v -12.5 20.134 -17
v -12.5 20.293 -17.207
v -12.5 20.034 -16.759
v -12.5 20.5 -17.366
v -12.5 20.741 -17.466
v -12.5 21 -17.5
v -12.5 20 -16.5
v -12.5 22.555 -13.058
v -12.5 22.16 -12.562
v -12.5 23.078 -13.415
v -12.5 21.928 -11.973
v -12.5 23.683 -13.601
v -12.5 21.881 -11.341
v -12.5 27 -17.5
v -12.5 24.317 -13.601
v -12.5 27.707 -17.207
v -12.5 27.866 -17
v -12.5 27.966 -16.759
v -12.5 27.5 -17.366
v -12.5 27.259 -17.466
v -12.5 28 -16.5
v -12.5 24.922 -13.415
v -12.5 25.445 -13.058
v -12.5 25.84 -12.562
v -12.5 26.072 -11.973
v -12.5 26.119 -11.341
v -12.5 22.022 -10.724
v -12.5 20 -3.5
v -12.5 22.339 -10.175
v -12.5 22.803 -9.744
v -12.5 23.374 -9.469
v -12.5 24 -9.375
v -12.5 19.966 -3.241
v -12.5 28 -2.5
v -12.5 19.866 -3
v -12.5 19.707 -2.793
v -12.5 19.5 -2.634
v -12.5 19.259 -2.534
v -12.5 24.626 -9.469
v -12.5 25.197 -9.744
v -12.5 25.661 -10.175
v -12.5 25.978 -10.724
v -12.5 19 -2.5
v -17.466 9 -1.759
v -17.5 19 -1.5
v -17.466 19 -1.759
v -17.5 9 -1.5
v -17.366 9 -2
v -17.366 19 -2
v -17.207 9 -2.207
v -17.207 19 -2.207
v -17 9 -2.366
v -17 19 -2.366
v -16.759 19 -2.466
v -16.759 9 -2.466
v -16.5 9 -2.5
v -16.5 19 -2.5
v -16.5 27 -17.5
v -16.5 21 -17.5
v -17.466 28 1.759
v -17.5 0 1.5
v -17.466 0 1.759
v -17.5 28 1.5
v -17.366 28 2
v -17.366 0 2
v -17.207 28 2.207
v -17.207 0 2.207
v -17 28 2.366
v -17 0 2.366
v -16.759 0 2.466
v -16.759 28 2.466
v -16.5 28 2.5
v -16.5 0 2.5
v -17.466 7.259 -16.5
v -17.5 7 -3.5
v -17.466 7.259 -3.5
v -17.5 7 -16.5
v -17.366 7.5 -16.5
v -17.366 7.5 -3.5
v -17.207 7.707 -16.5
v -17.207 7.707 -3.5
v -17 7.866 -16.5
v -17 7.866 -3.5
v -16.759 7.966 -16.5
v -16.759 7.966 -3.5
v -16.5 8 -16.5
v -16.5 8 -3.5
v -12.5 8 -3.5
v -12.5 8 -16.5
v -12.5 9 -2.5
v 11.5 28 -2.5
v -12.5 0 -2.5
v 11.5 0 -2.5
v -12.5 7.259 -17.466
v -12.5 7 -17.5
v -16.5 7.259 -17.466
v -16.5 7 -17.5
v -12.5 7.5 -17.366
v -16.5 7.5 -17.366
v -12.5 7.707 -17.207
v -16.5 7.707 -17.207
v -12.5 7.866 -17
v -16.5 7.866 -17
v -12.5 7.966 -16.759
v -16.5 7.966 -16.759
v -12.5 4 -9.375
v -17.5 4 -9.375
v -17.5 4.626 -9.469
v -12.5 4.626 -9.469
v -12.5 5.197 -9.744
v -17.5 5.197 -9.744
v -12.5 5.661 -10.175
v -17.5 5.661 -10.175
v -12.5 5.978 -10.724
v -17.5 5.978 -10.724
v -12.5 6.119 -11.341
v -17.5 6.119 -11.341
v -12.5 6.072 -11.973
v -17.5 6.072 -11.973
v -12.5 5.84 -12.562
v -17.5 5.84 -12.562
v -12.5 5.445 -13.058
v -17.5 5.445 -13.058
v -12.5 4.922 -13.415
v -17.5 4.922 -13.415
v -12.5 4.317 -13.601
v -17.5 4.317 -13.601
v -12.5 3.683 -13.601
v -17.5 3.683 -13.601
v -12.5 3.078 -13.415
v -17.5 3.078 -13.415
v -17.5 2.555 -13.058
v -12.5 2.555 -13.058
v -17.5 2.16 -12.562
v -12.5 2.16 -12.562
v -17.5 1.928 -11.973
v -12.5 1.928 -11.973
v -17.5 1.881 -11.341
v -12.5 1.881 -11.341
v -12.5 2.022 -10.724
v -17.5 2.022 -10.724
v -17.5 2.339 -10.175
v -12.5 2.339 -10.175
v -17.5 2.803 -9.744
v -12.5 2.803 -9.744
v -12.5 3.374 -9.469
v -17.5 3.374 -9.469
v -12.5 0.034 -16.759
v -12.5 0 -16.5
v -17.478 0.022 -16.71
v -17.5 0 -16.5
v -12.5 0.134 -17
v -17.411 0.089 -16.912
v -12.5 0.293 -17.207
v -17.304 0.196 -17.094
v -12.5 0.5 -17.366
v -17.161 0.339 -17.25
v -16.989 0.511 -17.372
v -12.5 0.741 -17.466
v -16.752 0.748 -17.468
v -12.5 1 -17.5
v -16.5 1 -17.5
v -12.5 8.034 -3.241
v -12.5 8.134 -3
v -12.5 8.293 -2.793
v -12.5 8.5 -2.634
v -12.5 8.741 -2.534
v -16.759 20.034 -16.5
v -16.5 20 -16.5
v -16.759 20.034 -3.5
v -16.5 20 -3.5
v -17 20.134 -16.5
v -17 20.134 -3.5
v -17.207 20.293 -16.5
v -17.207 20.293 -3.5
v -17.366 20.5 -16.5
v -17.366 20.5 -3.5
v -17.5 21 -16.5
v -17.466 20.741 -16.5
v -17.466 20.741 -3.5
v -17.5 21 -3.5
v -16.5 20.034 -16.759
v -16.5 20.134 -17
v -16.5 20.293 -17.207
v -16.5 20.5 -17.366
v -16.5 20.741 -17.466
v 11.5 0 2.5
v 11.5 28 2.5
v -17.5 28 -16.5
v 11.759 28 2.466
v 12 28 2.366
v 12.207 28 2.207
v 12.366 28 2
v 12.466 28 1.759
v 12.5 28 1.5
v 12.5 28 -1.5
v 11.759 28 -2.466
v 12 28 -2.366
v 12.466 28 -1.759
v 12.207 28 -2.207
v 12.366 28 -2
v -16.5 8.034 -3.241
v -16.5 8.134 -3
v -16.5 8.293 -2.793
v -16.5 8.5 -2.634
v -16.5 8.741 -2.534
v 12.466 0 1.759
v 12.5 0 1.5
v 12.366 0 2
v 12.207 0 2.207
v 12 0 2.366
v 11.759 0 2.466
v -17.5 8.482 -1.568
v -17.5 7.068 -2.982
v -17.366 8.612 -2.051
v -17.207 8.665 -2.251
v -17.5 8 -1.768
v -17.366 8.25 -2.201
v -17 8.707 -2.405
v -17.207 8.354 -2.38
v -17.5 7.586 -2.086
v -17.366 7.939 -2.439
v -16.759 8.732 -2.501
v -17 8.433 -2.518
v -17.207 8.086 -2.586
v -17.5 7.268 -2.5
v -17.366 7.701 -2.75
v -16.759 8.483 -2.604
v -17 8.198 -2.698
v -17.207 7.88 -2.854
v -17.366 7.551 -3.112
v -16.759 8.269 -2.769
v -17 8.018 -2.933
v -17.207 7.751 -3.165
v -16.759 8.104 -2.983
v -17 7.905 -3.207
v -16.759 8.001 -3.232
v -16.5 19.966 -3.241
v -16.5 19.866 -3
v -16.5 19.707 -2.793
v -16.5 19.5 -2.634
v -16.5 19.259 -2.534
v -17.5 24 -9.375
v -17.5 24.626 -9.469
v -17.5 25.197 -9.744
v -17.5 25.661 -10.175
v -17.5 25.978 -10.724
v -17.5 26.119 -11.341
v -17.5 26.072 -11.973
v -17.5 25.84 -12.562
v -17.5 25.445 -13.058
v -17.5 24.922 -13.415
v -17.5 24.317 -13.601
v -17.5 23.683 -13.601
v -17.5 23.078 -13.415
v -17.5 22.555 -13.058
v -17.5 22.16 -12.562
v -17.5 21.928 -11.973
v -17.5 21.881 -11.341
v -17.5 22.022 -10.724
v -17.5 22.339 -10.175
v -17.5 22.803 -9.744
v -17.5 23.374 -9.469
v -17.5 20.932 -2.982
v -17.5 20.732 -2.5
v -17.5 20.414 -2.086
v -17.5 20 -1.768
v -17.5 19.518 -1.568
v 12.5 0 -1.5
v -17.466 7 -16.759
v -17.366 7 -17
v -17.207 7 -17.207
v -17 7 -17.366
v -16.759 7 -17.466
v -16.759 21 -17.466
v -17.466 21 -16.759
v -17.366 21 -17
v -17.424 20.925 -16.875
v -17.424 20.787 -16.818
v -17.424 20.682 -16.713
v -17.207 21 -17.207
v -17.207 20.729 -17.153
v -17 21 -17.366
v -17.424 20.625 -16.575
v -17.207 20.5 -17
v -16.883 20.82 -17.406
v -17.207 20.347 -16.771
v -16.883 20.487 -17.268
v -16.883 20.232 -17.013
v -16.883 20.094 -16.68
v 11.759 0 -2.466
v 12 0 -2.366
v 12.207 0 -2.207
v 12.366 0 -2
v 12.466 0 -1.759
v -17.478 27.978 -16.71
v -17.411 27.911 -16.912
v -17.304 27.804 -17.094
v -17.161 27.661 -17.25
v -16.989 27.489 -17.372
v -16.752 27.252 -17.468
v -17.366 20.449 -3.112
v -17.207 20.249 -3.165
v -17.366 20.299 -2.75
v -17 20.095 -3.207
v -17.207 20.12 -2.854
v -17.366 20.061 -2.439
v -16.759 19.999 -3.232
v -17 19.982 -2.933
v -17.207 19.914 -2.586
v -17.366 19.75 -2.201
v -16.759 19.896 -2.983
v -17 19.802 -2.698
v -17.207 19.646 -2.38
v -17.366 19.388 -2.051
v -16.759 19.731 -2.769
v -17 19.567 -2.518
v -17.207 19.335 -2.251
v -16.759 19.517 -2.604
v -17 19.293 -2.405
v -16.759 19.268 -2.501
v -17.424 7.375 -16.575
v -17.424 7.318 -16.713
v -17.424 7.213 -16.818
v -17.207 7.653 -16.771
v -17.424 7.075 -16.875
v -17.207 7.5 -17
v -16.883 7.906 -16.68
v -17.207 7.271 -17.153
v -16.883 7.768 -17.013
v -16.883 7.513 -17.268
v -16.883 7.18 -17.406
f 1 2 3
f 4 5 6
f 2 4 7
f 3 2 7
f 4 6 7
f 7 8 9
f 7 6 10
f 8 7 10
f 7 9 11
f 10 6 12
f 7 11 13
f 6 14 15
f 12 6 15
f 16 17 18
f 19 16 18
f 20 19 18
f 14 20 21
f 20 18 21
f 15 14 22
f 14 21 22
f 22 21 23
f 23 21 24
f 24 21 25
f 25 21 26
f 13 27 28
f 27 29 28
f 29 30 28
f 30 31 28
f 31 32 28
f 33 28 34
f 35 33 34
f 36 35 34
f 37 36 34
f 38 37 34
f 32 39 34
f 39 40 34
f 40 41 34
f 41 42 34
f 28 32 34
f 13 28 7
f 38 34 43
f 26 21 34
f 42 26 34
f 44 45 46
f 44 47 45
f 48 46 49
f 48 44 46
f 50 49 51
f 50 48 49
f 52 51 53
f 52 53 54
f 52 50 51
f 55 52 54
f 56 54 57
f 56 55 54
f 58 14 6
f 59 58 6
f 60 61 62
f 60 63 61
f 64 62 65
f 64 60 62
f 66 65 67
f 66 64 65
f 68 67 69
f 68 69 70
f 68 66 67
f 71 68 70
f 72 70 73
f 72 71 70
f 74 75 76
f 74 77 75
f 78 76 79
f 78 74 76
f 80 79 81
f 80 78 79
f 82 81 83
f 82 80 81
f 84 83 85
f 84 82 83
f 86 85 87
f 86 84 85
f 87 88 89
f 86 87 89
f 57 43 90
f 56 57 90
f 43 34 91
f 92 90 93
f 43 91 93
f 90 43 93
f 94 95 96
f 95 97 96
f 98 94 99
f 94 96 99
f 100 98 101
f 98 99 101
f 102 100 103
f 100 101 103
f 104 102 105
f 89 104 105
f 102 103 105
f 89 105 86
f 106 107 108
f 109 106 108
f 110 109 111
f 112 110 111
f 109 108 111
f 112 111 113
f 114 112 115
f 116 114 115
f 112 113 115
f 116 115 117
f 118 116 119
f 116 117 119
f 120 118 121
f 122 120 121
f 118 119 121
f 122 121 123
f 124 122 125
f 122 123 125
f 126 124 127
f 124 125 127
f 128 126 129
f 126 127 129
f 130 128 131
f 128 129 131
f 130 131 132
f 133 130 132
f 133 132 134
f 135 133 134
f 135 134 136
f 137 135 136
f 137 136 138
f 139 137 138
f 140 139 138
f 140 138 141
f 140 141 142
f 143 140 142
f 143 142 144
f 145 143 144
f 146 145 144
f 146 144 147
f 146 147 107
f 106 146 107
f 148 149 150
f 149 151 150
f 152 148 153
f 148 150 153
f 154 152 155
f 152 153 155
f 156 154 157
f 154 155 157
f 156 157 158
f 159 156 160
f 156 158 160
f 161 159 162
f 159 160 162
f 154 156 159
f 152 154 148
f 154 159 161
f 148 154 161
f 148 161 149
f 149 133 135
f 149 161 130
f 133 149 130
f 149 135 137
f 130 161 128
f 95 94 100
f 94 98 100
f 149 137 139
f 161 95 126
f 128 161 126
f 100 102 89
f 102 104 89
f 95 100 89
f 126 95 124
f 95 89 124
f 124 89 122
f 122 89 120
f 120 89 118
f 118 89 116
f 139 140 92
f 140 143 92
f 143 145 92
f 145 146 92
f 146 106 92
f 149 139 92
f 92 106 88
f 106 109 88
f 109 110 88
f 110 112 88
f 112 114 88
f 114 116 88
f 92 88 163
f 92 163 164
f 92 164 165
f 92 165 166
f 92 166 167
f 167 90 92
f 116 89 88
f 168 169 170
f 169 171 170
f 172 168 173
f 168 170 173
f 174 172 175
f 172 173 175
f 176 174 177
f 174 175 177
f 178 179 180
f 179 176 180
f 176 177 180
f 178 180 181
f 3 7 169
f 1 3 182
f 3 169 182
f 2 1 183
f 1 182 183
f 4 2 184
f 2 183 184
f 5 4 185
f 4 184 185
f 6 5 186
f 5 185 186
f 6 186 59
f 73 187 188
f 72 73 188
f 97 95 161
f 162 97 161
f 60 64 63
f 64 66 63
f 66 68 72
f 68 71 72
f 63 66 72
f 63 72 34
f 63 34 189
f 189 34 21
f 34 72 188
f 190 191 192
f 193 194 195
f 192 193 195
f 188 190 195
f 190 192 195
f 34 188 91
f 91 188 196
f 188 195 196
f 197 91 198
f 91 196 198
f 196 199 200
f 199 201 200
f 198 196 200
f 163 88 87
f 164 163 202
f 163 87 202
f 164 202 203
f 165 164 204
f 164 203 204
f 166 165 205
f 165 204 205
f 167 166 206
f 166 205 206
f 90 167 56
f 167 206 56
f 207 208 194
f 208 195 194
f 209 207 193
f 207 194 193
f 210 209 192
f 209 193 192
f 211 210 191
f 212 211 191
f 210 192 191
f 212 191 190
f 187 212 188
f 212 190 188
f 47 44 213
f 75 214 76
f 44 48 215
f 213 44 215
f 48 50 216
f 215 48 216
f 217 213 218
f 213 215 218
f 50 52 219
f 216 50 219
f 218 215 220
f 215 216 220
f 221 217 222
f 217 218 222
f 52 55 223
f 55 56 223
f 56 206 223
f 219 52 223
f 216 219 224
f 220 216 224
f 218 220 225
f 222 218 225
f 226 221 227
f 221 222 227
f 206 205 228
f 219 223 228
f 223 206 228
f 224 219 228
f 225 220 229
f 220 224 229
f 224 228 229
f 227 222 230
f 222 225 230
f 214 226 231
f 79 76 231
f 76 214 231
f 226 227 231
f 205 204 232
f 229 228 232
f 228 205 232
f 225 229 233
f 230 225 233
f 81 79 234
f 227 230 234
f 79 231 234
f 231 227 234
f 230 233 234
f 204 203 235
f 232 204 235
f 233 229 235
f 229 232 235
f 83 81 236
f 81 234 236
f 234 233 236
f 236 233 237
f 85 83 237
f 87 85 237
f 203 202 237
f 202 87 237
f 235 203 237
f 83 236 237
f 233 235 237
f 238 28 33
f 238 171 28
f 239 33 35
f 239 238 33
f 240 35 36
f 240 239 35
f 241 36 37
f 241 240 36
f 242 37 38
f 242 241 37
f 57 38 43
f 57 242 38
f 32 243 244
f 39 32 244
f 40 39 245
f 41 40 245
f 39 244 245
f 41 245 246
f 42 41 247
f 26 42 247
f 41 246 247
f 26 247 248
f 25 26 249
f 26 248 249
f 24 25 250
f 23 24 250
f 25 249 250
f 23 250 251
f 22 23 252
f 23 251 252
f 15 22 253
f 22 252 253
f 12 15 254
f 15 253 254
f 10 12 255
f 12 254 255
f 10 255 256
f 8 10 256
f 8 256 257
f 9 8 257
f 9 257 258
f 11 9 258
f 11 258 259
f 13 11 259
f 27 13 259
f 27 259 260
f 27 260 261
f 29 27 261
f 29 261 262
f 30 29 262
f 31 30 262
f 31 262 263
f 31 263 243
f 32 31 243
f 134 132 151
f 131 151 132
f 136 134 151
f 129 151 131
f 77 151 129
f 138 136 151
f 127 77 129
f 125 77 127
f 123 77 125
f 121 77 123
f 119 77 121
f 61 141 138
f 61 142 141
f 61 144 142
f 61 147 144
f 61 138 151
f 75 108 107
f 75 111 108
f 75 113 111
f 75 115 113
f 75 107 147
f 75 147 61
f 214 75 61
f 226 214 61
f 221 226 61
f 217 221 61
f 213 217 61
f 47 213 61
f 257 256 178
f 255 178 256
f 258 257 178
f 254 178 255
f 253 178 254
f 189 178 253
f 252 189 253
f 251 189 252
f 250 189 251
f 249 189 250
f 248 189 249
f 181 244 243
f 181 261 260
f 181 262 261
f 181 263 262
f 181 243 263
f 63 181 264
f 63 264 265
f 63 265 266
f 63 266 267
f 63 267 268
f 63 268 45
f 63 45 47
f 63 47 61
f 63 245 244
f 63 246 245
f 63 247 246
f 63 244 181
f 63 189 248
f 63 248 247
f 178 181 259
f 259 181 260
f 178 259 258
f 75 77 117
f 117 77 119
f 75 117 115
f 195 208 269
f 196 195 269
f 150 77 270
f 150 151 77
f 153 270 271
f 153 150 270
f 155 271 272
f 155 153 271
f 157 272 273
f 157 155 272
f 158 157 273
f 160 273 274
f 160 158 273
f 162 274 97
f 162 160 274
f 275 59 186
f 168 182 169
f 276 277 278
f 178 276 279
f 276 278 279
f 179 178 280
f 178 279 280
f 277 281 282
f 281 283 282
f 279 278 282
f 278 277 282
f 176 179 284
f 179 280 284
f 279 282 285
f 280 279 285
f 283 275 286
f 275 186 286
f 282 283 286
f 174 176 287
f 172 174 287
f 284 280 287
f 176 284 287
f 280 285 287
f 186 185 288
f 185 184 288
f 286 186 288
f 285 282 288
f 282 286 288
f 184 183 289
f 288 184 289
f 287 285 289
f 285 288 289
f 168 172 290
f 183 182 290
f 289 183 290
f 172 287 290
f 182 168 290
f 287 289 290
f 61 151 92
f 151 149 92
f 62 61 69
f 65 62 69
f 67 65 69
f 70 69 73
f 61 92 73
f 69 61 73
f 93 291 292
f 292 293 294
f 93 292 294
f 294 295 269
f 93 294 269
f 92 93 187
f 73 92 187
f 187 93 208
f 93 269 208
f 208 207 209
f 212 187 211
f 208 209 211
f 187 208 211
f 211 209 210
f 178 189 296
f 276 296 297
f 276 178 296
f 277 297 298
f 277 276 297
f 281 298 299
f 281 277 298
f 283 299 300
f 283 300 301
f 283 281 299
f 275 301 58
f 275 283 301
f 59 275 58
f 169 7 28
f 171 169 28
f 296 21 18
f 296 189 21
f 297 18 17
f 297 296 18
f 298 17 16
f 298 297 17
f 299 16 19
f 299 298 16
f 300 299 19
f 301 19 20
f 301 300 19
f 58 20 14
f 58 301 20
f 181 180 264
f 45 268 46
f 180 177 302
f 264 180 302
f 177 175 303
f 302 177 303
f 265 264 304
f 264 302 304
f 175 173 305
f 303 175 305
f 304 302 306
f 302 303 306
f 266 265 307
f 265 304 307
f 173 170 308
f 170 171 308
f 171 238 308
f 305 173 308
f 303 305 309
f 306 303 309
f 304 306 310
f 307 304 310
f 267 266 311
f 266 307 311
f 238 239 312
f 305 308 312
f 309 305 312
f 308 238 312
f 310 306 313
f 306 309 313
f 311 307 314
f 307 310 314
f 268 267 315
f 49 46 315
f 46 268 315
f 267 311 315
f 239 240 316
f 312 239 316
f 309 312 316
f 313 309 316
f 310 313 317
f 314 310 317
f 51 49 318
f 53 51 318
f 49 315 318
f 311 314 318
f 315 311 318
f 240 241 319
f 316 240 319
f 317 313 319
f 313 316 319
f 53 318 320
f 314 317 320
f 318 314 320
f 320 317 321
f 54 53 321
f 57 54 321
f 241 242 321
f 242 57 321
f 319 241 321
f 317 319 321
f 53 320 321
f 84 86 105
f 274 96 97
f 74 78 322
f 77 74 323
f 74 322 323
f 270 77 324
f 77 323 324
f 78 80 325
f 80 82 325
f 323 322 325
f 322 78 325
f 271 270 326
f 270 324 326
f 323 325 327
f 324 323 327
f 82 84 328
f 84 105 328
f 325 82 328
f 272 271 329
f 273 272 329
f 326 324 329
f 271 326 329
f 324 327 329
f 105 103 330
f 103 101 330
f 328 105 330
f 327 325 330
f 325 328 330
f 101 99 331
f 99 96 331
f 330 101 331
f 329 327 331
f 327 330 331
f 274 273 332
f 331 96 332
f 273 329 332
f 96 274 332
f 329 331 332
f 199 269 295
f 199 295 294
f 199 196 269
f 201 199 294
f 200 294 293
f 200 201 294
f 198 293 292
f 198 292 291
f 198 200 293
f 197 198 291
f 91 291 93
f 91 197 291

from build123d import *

# Parameters (mm, degrees)
SKETCH1_W           = 25
SKETCH1_H           = 5
BOSS_EXTRUDE1_DEPTH = 28
BOSS_EXTRUDE3_DEPTH = 5
FILLET2_R           = 1
CUT_EXTRUDE2_REACH  = 46.612
SKETCH5_R           = 2.125


with BuildPart() as part:
    # Sketch1 → Boss-Extrude1 (new body)
    with BuildSketch(Plane(origin=(0, 0, 0), x_dir=(1, 0, 0), z_dir=(0, 1, 0))):
        Rectangle(SKETCH1_W, SKETCH1_H)
    extrude(amount=BOSS_EXTRUDE1_DEPTH)

    # Sketch4 → Boss-Extrude3 (add)
    with BuildSketch(Plane.ZY.offset(12.5)):
        Polygon((-17.5, 20), (-2.5, 20), (-2.5, 8), (-17.5, 8), (-17.5, 0), (2.5, 0), (2.5, 28), (-17.5, 28), align=None)
    extrude(amount=BOSS_EXTRUDE3_DEPTH)

    # Fillet2
    fillet2_edges = [part.edges().sort_by_distance(p)[0] for p in [
        (-15, 28, -17.5),
        (-15, 20, -17.5),
        (-15, 20, -2.5),
        (-15, 8, -2.5),
        (-15, 8, -17.5),
        (-15, 0, -17.5),
        (-17.5, 14, 2.5),
        (-17.5, 24, -17.5),
        (-17.5, 20, -10),
        (-17.5, 14, -2.5),
        (-17.5, 8, -10),
        (-17.5, 4, -17.5),
        (12.5, 14, 2.5),
        (12.5, 14, -2.5),
    ]]
    fillet(fillet2_edges, radius=FILLET2_R)

    # Sketch5 → Cut-Extrude2 (cut, up to next)
    with BuildSketch(Plane.ZY.offset(17.5), mode=Mode.PRIVATE) as cut_extrude2_sk1:
        with Locations((-11.5, 24)):
            Circle(SKETCH5_R)
    cut_extrude2_tool1 = extrude(cut_extrude2_sk1.sketch, amount=-CUT_EXTRUDE2_REACH, mode=Mode.PRIVATE) & part.part
    # Sketch5 → Cut-Extrude2 (cut, up to next)
    with BuildSketch(Plane.ZY.offset(17.5), mode=Mode.PRIVATE) as cut_extrude2_sk2:
        with Locations((-11.5, 4)):
            Circle(SKETCH5_R)
    cut_extrude2_tool2 = extrude(cut_extrude2_sk2.sketch, amount=-CUT_EXTRUDE2_REACH, mode=Mode.PRIVATE) & part.part
    add(cut_extrude2_tool1.solids().sort_by_distance((-17.5, 24, -11.5))[0], mode=Mode.SUBTRACT)
    add(cut_extrude2_tool2.solids().sort_by_distance((-17.5, 4, -11.5))[0], mode=Mode.SUBTRACT)


solid = part.part
